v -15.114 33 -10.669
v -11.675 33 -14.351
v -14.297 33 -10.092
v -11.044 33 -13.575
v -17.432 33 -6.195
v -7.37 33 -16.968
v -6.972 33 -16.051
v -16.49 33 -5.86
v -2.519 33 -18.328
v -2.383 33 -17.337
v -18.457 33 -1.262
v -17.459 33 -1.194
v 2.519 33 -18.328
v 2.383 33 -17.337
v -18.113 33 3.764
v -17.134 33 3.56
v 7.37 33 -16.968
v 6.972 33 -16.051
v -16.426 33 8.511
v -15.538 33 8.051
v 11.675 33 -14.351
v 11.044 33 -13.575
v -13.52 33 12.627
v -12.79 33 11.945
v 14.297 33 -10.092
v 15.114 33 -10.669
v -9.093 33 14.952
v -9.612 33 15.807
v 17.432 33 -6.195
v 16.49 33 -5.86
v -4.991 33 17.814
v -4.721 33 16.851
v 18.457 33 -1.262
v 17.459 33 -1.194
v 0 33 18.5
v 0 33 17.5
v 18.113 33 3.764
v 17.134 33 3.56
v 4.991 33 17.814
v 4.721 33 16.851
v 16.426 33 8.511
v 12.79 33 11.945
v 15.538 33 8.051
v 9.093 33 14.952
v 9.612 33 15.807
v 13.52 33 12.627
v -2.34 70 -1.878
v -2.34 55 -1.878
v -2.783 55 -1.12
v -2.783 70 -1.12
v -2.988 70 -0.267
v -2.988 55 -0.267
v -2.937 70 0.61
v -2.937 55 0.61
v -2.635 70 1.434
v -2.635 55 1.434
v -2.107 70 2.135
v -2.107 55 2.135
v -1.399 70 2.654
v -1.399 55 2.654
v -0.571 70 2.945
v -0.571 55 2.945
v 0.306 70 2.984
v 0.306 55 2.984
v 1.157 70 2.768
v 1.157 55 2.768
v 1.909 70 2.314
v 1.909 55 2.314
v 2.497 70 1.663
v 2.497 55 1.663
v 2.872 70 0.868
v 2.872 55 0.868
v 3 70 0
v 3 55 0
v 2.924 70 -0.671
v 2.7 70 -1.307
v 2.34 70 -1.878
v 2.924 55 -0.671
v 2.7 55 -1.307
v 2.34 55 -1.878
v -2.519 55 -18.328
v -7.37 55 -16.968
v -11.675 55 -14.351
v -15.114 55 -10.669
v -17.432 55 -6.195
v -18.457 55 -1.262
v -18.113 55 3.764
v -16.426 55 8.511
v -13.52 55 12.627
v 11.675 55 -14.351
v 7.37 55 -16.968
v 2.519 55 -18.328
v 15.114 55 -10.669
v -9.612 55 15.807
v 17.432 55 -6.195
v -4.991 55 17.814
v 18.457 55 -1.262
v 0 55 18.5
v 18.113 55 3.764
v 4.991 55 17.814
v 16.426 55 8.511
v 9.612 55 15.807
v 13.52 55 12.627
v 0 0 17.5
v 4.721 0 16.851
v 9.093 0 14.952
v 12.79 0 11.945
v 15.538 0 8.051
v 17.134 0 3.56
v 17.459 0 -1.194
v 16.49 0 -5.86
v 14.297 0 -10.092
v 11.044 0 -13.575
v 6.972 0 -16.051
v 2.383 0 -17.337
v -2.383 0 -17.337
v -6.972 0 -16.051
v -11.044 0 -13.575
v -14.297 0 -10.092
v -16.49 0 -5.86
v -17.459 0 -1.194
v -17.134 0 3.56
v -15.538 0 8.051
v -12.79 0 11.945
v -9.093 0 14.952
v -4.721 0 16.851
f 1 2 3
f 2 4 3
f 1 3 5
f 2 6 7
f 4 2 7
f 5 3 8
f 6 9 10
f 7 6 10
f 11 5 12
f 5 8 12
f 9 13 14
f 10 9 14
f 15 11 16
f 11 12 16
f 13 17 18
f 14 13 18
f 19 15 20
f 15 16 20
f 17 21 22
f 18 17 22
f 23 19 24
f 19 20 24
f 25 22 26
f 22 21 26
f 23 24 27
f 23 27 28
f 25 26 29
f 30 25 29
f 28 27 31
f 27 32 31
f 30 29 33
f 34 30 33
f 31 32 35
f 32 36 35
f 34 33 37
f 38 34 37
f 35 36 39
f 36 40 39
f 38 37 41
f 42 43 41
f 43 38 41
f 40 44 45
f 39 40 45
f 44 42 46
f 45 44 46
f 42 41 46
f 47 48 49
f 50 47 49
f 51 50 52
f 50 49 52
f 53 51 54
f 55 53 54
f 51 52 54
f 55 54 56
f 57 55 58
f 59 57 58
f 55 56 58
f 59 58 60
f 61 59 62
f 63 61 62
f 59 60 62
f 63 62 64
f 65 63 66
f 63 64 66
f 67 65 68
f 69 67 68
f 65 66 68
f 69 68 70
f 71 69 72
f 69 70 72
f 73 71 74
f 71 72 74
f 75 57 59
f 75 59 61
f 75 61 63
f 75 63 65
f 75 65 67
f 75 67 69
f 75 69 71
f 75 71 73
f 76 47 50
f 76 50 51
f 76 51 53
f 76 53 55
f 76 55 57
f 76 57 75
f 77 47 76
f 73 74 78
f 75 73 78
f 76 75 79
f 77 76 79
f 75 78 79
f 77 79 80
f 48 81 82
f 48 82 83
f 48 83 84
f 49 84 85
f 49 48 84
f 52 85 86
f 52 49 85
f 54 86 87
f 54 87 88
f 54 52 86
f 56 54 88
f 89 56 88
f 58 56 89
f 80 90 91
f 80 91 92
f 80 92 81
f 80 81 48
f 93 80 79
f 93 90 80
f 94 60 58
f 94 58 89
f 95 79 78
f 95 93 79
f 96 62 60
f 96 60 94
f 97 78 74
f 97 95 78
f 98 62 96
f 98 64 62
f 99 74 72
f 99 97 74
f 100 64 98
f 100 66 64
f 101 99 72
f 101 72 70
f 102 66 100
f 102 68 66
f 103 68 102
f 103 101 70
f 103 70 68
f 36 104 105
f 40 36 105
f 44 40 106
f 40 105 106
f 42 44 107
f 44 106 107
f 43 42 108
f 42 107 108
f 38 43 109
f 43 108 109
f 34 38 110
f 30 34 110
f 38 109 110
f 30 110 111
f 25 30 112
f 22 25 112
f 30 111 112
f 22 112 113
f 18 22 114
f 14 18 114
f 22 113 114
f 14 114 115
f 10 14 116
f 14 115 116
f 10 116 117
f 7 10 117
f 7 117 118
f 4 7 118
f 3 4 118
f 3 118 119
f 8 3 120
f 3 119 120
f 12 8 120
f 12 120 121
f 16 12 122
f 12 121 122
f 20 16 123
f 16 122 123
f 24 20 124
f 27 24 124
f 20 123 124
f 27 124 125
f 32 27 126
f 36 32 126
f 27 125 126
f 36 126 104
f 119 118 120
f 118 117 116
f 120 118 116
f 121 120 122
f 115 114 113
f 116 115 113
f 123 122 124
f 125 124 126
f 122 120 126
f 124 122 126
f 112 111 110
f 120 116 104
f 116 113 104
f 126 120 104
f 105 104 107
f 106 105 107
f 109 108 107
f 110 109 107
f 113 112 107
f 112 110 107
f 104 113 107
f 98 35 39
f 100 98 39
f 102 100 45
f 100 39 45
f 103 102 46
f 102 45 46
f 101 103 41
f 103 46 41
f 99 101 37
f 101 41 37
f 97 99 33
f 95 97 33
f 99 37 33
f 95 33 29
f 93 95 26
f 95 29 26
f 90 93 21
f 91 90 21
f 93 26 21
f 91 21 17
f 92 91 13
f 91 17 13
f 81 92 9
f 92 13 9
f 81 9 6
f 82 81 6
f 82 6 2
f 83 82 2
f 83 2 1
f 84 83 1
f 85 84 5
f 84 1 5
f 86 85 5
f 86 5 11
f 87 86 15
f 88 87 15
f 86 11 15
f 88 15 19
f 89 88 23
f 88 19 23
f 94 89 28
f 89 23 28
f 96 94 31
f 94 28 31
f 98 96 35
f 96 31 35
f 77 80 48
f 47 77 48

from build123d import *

# Parameters (mm, degrees)
SKETCH_1_R      = 17.5
EXTRUDE_1_DEPTH = 33
SKETCH_2_R      = 18.5
EXTRUDE_2_DEPTH = 22
EXTRUDE_3_DEPTH = 15


with BuildPart() as part:
    # 草图1 → 凸台-拉伸1 (new body)
    with BuildSketch(Plane(origin=(0, 0, 0), x_dir=(1, 0, 0), z_dir=(0, 1, 0))):
        with Locations(Location((0, 0, 0), (0, 0, 270))):
            Circle(SKETCH_1_R)
    extrude(amount=EXTRUDE_1_DEPTH)

    # 草图2 → 凸台-拉伸2 (add)
    with BuildSketch(Plane(origin=(0, 33, 0), x_dir=(1, 0, 0), z_dir=(0, 1, 0))):
        with Locations(Location((0, 0, 0), (0, 0, 270))):
            Circle(SKETCH_2_R)
    extrude(amount=EXTRUDE_2_DEPTH)

    # 草图3 → 凸台-拉伸3 (add)
    with BuildSketch(Plane(origin=(0, 55, 0), x_dir=(1, 0, 0), z_dir=(0, 1, 0))):
        with BuildLine():
            Line((2.339523617, 1.877932173), (0, 1.877932173))
            Line((0, 1.877932173), (-2.339523617, 1.877932173))
            ThreePointArc((-2.339523617, 1.877932173), (-0.99534646, -2.830068095), (3, 0))
            ThreePointArc((3, 0), (2.830068095, 0.99534646), (2.339523617, 1.877932173))
        make_face()
    extrude(amount=EXTRUDE_3_DEPTH)


solid = part.part
